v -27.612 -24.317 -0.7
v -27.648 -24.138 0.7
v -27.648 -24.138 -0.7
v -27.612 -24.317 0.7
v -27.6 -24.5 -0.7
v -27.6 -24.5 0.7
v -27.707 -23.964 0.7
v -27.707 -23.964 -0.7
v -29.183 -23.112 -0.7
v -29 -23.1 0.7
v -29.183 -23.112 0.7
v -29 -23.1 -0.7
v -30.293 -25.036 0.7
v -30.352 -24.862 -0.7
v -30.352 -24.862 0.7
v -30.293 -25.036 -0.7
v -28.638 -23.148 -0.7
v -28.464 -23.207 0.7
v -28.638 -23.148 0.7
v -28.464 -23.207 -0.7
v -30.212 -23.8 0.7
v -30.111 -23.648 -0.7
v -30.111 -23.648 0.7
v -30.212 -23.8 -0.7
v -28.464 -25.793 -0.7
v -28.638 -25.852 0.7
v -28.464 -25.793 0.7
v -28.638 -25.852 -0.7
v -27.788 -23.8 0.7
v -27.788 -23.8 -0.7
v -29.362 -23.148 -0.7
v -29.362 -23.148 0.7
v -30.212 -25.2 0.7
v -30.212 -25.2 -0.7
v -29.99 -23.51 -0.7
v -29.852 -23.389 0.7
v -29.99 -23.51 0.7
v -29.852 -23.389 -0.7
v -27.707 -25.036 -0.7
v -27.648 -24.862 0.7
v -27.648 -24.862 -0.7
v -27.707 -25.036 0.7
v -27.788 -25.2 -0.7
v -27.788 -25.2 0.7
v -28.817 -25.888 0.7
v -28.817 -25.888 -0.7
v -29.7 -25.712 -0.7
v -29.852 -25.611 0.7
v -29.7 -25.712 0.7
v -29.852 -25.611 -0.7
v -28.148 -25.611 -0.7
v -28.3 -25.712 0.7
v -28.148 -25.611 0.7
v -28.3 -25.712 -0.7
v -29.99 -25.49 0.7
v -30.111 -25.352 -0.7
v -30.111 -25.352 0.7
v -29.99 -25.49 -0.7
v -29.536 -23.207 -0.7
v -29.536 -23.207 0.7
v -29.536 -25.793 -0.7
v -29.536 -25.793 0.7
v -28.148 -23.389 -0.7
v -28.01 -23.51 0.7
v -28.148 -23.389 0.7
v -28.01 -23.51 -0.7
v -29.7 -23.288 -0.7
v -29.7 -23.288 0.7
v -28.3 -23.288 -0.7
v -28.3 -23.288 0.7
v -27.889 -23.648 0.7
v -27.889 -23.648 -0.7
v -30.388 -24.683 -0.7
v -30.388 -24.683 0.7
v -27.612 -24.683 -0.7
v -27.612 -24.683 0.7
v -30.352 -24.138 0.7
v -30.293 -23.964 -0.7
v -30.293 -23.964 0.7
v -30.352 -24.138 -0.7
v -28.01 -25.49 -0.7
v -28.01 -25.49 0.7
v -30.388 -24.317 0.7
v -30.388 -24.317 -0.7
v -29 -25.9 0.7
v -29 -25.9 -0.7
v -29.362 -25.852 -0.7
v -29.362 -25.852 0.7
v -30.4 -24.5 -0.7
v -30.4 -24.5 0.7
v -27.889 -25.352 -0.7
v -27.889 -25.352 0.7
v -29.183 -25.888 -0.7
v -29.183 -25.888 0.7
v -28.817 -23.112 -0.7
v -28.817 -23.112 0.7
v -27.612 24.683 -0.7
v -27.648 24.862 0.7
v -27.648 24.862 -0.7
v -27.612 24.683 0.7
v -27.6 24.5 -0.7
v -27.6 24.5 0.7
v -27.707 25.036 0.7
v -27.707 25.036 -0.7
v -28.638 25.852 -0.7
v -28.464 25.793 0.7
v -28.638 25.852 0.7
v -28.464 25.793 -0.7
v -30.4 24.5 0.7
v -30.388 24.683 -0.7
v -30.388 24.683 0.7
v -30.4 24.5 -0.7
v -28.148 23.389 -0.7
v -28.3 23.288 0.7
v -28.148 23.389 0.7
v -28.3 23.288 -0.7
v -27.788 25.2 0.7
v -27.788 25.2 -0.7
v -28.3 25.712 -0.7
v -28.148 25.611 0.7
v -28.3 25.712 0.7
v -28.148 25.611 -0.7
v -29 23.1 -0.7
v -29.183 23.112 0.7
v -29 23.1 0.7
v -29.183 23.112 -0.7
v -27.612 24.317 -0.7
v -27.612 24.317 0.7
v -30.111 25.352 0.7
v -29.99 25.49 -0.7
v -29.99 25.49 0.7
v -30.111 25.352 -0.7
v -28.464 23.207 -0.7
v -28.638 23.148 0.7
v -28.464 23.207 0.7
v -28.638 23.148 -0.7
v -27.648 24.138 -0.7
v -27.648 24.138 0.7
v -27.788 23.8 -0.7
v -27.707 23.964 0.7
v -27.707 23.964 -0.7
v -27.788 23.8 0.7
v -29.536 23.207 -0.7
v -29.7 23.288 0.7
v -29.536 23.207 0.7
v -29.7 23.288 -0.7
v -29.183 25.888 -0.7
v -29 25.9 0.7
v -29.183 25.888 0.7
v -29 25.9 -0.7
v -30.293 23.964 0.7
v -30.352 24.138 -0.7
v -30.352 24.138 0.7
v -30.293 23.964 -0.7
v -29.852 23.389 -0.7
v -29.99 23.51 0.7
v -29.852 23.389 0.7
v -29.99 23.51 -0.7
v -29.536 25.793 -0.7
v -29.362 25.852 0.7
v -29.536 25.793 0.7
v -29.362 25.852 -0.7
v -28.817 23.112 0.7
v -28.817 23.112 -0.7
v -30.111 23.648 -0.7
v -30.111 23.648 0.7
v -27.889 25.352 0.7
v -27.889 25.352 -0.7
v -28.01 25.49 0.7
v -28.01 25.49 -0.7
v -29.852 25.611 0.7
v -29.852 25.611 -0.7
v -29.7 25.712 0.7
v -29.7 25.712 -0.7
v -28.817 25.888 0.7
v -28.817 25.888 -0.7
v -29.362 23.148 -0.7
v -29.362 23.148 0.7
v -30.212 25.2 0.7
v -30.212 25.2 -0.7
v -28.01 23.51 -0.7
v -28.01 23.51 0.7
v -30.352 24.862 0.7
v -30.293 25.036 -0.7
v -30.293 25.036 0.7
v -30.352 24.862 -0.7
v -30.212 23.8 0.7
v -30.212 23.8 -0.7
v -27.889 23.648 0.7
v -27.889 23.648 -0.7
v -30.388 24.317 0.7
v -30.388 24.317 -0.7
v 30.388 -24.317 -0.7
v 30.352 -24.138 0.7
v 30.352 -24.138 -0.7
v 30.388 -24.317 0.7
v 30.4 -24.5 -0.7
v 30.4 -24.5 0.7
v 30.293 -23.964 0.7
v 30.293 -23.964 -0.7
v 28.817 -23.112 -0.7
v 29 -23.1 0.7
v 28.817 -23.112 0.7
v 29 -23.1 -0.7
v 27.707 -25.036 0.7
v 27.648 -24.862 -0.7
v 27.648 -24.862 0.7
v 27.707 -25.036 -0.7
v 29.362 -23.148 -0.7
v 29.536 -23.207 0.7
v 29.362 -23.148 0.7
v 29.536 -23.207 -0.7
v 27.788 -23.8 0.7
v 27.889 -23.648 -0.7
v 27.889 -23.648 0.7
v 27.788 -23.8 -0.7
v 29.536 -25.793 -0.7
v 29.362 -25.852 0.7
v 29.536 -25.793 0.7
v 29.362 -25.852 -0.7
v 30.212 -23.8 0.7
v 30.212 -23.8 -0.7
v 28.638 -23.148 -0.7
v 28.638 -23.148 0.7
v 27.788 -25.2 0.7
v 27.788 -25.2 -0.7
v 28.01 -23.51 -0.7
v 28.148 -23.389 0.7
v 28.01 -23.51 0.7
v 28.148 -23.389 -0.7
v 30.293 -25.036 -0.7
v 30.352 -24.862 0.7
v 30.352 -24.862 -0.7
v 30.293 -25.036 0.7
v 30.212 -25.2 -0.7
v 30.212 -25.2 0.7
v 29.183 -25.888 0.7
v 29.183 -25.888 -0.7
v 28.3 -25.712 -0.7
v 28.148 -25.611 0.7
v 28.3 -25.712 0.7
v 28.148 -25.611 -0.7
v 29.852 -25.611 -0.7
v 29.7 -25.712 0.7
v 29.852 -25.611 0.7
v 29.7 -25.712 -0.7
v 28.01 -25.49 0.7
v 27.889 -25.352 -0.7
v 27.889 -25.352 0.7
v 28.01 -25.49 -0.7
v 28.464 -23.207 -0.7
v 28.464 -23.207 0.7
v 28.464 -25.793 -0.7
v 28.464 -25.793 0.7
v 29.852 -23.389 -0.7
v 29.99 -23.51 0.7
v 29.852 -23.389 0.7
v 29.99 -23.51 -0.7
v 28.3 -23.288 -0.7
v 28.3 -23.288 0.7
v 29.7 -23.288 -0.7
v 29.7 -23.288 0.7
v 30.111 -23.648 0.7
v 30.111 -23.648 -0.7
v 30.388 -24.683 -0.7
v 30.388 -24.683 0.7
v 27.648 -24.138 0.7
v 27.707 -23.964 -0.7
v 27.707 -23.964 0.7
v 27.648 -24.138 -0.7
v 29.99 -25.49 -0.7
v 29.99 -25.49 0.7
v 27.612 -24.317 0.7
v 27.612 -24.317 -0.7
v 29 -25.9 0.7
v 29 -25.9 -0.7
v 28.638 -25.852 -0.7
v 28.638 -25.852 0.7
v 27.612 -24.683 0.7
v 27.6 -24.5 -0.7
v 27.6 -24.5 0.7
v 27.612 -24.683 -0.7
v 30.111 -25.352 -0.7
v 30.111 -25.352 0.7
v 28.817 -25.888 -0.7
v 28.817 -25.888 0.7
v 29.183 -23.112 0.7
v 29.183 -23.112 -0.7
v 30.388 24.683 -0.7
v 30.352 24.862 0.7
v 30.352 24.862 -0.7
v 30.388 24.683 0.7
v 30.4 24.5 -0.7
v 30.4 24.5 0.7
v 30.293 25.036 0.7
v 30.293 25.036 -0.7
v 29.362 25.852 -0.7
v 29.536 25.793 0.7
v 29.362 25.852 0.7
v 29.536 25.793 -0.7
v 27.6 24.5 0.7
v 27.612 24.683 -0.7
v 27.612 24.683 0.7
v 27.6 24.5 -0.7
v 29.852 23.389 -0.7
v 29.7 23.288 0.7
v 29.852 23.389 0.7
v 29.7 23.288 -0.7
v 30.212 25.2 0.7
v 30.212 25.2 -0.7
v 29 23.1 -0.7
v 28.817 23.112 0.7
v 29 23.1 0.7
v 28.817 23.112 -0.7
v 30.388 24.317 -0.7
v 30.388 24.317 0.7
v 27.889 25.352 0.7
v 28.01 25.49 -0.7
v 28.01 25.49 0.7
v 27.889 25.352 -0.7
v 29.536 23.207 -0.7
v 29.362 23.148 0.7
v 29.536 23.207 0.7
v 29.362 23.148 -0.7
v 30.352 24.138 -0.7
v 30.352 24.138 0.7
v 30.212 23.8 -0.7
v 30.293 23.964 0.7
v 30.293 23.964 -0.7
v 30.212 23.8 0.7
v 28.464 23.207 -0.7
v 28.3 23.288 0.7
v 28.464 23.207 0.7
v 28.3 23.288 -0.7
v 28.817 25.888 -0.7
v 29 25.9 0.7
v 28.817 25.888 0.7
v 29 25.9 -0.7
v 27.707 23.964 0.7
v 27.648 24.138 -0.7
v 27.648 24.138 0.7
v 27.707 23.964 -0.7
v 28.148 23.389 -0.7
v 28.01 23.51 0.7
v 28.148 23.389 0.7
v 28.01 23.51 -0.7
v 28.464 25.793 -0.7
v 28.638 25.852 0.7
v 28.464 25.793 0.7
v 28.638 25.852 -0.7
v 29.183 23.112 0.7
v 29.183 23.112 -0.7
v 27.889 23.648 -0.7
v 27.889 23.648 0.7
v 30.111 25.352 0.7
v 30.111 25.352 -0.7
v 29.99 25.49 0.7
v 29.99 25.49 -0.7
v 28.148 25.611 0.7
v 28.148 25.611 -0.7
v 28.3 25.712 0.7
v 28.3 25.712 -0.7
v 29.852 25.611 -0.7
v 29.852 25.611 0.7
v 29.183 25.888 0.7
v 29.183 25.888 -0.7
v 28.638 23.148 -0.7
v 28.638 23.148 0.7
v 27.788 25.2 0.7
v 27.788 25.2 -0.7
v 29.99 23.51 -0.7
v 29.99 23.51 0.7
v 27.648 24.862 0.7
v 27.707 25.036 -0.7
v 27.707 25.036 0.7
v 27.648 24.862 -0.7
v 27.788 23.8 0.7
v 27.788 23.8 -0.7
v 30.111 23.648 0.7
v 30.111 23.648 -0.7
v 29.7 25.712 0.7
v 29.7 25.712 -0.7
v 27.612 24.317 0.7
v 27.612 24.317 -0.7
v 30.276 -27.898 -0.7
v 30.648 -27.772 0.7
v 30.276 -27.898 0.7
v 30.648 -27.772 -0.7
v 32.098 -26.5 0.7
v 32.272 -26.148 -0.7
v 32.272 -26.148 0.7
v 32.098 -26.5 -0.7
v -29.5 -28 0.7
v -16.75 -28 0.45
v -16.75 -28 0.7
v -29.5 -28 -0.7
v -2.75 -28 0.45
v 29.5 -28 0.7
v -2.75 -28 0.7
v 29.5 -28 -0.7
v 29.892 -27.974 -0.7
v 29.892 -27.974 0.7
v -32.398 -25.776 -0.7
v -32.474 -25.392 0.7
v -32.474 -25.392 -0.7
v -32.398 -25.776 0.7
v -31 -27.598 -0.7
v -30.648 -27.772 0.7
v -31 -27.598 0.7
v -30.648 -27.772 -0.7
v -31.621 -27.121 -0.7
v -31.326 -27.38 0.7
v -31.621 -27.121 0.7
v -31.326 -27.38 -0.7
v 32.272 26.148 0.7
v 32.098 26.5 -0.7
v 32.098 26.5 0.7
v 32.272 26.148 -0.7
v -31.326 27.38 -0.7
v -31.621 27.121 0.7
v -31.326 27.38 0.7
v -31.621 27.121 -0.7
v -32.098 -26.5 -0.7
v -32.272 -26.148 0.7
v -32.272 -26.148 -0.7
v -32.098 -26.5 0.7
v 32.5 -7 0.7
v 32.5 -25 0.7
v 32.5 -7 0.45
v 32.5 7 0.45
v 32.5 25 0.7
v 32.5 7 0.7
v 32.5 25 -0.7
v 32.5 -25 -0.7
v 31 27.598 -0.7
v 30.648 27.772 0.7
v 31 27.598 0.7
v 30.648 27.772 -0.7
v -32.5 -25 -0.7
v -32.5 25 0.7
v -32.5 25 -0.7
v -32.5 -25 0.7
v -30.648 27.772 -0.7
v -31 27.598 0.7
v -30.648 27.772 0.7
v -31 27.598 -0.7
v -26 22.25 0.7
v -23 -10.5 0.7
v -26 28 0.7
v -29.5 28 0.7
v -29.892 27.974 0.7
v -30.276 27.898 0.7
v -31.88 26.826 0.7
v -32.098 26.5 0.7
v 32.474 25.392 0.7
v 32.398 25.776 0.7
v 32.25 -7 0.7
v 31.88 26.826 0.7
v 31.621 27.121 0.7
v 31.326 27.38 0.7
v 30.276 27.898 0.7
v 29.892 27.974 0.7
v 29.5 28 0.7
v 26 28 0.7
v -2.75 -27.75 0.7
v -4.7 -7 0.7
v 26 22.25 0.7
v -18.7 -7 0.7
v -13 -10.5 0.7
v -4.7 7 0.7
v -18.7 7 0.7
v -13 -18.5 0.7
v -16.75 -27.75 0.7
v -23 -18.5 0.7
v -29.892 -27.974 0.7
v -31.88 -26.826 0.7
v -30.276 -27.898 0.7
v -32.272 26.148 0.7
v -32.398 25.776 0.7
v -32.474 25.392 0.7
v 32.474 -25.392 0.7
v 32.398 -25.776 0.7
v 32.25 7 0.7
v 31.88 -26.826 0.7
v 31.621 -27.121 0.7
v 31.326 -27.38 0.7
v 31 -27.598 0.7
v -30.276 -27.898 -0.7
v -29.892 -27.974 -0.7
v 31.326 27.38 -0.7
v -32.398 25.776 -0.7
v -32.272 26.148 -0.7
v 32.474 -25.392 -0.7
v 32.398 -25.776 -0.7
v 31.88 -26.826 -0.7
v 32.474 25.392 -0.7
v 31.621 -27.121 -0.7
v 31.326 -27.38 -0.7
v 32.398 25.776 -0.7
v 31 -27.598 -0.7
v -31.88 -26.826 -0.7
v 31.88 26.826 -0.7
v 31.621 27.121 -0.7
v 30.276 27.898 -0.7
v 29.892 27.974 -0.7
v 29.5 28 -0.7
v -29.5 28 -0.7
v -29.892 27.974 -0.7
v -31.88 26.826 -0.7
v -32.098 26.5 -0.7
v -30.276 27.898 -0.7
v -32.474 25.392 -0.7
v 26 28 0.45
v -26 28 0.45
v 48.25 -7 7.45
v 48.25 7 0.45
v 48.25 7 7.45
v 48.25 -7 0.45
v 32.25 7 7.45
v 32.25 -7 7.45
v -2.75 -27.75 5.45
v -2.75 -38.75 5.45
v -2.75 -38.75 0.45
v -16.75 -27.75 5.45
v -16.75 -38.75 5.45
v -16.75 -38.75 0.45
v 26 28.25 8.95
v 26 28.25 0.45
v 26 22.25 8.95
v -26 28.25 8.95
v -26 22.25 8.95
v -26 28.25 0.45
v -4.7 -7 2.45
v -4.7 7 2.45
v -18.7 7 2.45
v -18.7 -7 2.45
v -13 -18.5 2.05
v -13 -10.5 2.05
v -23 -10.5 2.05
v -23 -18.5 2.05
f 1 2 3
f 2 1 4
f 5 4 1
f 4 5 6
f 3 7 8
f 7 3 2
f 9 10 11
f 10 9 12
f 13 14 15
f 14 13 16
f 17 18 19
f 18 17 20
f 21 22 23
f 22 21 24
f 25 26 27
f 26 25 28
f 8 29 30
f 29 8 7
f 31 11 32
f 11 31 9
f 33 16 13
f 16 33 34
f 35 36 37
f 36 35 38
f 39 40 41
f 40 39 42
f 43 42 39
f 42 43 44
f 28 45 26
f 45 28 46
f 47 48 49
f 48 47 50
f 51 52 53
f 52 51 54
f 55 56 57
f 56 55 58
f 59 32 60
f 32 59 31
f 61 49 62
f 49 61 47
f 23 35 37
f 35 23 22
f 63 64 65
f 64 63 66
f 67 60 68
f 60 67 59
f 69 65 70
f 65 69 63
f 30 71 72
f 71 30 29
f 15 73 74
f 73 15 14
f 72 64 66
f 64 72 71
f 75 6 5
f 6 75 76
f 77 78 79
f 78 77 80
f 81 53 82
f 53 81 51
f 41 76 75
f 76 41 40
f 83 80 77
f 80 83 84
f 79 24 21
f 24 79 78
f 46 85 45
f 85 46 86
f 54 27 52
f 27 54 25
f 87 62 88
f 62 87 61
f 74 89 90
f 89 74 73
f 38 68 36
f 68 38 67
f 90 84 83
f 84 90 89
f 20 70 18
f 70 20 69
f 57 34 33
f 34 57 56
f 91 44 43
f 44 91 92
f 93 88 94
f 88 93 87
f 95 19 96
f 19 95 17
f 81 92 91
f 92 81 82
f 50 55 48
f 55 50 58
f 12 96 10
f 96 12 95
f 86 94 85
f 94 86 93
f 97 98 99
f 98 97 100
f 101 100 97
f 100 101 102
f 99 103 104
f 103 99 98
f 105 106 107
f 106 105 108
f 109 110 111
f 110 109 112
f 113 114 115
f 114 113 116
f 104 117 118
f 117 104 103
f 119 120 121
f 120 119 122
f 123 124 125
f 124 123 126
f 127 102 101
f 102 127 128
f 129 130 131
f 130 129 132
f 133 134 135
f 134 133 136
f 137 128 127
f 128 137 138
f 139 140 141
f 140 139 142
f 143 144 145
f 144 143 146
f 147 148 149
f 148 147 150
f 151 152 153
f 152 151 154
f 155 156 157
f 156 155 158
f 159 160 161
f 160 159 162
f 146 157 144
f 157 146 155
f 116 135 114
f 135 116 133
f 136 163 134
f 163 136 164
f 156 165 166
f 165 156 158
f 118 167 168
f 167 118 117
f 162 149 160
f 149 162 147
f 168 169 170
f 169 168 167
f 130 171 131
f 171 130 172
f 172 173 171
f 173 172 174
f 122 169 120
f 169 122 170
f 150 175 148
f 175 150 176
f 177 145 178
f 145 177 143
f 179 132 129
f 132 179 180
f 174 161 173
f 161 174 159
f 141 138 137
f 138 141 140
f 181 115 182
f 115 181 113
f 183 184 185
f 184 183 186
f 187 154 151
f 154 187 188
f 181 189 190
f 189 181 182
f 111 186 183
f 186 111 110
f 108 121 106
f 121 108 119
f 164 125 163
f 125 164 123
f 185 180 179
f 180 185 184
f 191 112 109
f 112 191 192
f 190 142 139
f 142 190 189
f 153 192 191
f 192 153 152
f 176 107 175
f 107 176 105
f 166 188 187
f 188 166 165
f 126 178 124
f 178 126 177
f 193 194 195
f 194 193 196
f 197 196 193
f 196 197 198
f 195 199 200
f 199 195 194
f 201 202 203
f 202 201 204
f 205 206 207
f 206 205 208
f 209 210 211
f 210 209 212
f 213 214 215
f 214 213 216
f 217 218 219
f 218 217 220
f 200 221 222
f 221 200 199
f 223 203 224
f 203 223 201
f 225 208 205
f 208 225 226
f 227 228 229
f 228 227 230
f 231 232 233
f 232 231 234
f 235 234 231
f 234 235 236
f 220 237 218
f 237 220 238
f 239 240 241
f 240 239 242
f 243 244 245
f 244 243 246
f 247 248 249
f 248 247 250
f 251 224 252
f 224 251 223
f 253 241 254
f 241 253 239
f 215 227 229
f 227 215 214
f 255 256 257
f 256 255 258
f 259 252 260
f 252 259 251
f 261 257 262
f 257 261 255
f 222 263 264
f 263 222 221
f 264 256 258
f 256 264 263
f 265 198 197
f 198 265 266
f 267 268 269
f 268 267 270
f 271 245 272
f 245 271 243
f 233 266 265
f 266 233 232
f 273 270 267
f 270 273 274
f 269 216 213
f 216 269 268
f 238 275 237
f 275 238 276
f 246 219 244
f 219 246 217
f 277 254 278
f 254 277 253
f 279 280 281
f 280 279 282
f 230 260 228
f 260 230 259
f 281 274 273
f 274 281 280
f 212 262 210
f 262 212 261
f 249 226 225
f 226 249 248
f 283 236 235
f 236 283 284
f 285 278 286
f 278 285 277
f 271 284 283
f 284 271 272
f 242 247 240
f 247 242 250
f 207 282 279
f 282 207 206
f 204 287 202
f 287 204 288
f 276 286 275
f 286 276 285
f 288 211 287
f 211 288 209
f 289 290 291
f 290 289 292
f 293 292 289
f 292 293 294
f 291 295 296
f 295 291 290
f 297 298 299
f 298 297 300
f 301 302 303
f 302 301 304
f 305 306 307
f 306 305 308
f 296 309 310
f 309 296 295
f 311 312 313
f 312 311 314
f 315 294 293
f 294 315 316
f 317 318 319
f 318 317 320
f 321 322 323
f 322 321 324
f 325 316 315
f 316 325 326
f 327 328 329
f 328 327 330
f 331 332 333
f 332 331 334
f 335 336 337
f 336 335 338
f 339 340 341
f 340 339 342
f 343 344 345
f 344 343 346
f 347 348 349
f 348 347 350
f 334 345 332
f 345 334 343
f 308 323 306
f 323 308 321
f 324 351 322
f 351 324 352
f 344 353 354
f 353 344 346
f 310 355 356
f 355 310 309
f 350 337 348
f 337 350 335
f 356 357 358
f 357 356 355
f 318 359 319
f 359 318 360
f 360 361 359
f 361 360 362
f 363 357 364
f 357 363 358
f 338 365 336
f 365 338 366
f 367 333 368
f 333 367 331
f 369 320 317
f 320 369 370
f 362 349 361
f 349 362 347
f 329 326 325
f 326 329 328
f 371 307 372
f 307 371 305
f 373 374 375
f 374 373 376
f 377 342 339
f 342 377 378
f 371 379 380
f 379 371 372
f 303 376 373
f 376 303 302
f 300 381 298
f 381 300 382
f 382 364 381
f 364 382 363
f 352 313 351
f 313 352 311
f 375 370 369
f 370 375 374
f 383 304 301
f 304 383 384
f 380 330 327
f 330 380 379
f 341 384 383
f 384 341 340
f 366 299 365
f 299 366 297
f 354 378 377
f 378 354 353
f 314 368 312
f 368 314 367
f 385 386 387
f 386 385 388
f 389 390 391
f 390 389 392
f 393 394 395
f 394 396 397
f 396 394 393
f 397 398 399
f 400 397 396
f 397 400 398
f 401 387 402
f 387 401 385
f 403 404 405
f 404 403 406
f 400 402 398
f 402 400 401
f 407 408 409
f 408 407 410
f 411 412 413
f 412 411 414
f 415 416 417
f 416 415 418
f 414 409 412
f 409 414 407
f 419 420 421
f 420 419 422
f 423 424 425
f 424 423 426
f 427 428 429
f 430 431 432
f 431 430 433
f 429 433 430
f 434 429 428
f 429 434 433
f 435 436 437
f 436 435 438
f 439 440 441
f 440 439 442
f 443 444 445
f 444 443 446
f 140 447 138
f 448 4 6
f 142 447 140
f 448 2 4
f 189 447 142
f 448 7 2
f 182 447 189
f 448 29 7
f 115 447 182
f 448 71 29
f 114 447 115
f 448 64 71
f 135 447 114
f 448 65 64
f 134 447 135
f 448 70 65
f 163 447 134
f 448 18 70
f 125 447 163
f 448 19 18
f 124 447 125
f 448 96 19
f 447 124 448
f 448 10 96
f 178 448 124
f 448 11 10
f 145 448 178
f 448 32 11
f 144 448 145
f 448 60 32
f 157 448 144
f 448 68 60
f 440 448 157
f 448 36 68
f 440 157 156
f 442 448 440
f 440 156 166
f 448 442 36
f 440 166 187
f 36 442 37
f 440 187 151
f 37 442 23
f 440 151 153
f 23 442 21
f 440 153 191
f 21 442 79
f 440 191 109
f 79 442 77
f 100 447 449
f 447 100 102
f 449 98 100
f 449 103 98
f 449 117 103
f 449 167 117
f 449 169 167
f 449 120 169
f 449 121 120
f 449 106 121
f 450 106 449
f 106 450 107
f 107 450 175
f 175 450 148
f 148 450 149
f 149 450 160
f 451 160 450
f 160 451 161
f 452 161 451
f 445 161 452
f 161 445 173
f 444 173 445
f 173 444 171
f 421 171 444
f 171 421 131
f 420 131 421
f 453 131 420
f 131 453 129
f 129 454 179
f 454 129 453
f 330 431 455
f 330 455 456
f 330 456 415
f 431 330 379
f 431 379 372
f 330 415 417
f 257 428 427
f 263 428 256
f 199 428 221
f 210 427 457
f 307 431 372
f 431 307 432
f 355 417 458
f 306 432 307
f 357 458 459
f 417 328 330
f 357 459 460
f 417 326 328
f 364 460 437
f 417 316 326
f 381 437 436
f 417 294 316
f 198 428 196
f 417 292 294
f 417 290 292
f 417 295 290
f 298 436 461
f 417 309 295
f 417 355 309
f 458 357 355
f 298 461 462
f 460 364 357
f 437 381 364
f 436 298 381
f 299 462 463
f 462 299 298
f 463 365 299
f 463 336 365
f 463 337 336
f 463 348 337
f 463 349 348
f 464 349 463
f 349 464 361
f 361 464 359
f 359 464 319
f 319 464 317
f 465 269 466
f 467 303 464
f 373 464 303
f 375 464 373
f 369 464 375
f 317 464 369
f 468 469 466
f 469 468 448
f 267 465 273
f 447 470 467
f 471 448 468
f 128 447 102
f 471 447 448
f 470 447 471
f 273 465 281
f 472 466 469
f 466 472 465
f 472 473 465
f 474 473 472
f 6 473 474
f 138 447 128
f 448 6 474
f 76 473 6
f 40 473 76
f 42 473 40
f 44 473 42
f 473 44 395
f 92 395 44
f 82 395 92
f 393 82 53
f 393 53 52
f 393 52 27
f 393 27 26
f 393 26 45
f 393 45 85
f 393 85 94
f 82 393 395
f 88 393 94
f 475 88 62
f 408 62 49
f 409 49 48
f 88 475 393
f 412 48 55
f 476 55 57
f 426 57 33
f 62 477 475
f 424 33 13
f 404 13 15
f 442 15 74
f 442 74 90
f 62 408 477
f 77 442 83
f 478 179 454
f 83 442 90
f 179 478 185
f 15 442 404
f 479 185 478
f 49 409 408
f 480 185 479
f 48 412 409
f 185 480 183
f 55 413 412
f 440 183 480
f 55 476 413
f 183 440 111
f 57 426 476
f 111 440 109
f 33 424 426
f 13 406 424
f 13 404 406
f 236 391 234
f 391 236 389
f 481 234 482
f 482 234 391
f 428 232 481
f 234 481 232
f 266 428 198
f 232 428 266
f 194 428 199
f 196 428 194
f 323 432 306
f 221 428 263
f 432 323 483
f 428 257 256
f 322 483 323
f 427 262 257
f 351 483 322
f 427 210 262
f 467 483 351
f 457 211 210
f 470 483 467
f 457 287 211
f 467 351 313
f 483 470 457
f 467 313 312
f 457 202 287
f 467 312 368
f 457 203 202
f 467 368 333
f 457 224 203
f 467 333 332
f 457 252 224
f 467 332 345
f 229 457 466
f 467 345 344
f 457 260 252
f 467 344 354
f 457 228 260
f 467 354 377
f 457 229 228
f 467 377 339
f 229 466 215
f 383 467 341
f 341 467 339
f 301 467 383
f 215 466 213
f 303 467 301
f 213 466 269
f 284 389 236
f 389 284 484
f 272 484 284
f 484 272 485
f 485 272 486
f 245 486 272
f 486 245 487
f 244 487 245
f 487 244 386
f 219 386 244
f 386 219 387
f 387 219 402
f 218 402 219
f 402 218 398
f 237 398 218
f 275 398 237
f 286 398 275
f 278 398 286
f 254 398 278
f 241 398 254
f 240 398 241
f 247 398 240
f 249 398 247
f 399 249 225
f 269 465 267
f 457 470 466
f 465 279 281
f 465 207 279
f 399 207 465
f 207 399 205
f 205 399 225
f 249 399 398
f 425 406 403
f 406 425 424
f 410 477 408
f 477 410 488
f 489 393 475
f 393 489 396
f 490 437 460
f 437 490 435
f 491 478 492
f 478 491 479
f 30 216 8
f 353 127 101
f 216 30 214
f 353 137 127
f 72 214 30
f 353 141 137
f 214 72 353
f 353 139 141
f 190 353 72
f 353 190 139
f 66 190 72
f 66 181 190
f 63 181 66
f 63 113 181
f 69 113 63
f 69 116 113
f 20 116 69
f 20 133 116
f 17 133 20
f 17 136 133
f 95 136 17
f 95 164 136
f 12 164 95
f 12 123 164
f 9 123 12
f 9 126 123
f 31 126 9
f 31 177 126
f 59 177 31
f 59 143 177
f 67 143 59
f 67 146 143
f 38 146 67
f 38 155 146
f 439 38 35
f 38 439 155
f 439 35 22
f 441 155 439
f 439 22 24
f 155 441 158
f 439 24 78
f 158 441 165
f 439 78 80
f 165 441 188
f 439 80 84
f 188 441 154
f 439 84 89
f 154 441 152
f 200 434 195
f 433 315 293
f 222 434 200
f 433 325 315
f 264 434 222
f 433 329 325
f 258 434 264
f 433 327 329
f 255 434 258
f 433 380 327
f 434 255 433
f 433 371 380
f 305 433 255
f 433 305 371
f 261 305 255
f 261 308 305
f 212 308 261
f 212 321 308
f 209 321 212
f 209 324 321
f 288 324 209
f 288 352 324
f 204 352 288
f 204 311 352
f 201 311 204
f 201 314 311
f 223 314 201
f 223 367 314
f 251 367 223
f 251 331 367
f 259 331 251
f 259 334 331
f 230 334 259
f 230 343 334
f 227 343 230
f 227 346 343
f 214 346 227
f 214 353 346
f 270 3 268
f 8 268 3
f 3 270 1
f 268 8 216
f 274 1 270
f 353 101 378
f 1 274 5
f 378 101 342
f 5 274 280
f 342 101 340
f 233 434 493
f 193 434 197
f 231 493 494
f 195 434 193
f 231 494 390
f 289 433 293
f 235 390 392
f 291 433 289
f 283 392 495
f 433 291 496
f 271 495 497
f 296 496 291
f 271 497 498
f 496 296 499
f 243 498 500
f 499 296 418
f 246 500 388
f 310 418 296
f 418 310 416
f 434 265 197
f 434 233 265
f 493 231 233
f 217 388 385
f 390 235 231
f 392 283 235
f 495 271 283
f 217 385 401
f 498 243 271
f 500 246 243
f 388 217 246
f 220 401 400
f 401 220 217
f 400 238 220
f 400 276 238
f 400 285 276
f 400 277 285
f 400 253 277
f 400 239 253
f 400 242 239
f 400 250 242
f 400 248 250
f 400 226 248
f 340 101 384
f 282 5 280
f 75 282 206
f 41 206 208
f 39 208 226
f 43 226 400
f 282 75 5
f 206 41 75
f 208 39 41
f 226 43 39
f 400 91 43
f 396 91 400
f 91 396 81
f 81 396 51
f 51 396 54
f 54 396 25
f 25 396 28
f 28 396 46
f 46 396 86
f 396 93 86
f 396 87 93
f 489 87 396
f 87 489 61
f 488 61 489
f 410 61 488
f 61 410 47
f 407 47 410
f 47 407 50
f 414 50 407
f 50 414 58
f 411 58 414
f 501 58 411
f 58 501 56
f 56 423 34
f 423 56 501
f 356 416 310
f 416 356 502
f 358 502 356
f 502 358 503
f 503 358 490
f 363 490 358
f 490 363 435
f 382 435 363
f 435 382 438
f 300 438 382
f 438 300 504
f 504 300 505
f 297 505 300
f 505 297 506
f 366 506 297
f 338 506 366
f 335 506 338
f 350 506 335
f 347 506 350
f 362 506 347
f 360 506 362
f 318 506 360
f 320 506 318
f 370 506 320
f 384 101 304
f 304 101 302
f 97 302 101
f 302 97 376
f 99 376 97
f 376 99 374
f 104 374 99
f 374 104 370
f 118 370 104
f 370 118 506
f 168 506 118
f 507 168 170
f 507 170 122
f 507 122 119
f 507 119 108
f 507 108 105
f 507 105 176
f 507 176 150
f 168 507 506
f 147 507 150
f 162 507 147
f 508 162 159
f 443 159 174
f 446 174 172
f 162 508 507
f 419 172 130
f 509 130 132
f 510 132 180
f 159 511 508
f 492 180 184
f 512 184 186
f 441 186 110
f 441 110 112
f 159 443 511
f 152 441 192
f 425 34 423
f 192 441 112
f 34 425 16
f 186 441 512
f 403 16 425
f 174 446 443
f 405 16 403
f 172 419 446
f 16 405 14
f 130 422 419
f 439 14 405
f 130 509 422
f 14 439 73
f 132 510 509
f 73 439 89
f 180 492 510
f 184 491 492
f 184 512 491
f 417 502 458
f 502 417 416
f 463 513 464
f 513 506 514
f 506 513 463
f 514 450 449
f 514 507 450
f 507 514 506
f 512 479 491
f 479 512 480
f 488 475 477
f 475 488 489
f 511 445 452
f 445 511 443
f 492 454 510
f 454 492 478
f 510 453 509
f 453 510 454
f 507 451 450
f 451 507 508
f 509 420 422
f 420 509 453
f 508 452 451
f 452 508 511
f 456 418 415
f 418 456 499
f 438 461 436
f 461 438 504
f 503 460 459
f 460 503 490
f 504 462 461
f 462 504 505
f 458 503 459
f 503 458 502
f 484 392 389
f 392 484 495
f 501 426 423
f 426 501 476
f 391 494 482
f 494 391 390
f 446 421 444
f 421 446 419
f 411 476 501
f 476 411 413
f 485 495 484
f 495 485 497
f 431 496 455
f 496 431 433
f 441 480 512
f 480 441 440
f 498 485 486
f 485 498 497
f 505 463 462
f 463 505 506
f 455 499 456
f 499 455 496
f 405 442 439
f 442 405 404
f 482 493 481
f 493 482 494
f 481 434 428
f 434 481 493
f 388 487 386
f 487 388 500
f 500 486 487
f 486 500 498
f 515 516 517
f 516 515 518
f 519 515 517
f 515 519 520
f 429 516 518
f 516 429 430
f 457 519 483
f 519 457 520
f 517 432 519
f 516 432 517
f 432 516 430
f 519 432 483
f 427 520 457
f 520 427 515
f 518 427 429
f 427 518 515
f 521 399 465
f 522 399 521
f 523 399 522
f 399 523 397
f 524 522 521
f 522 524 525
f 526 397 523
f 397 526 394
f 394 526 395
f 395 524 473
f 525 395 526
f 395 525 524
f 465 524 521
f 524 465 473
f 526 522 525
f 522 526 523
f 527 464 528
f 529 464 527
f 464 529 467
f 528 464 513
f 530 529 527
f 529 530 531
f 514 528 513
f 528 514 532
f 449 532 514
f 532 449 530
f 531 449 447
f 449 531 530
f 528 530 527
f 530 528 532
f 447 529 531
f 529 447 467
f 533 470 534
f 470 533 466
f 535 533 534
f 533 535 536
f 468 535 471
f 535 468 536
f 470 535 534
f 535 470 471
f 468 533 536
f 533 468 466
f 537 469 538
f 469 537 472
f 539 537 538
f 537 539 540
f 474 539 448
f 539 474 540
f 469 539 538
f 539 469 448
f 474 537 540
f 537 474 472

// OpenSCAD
$fn = 48;

// Target SBC overall PCB size (RECTANGLE ONLY)
pcb_l = 65.0;     // X
pcb_w = 56.0;     // Y
pcb_t = 1.4;      // Z

// Visual/feature parameters
corner_r = 3.0;

// Mounting holes
hole_d = 2.8;
hole_edge_x = 3.5;   // from left/right edge to hole center
hole_edge_y = 3.5;   // from bottom/top edge to hole center

// Connectivity overlap (ensures one connected solid)
overlap = 0.25;

// USB-A like block on right edge
usb_w = 14.0;   // along Y
usb_d = 16.0;   // protrusion along +X
usb_h = 7.0;    // height above PCB

// HDMI-like block on bottom edge
hdmi_w = 14.0;  // along X
hdmi_d = 11.0;  // protrusion along -Y
hdmi_h = 5.0;

// 40-pin header block on top edge
hdr_w = 52.0;   // along X
hdr_d = 6.0;    // along Y
hdr_h = 8.5;

// Main SoC block
soc_x = 14.0;
soc_y = 14.0;
soc_h = 2.0;

// Small power/IC block
pwr_x = 10.0;
pwr_y = 8.0;
pwr_h = 1.6;

// Rounded rectangle prism helper (centered)
module rounded_rect_prism(l, w, h, r) {
    r2 = min(r, min(l, w)/2 - 0.01);
    linear_extrude(height = h, center = true)
        offset(r = r2)
            square([l - 2*r2, w - 2*r2], center = true);
}

module pcb_with_holes() {
    difference() {
        // Standard 65x56 rectangle (no tabs/extensions)
        rounded_rect_prism(pcb_l, pcb_w, pcb_t, corner_r);

        // Through holes
        for (sx = [-1, 1], sy = [-1, 1]) {
            translate([
                sx * (pcb_l/2 - hole_edge_x),
                sy * (pcb_w/2 - hole_edge_y),
                0
            ])
            cylinder(h = pcb_t + 1.0, d = hole_d, center = true);
        }
    }
}

module sbc() {
    union() {
        pcb_with_holes();

        // USB-A connector (right edge, centered in Y) - connected via overlap
        translate([
            pcb_l/2 + usb_d/2 - overlap,
            0,
            pcb_t/2 + usb_h/2 - overlap
        ])
        cube([usb_d, usb_w, usb_h], center = true);

        // HDMI connector (bottom edge, slightly left of center) - connected via overlap
        translate([
            -pcb_l*0.15,
            -(pcb_w/2 + hdmi_d/2 - overlap),
            pcb_t/2 + hdmi_h/2 - overlap
        ])
        cube([hdmi_w, hdmi_d, hdmi_h], center = true);

        // 40-pin header (top edge) - connected via overlap
        translate([
            0,
            pcb_w/2 - hdr_d/2 + overlap,
            pcb_t/2 + hdr_h/2 - overlap
        ])
        cube([hdr_w, hdr_d, hdr_h], center = true);

        // SoC (on top surface, left-ish) - connected via overlap
        translate([
            -pcb_l*0.18,
            0,
            pcb_t/2 + soc_h/2 - overlap
        ])
        cube([soc_x, soc_y, soc_h], center = true);

        // Small power/IC block (top surface, near bottom-left) - connected via overlap
        translate([
            -pcb_l/2 + (hole_edge_x + pwr_x/2 + 6),
            -pcb_w/2 + (hole_edge_y + pwr_y/2 + 6),
            pcb_t/2 + pwr_h/2 - overlap
        ])
        cube([pwr_x, pwr_y, pwr_h], center = true);
    }
}

sbc();
